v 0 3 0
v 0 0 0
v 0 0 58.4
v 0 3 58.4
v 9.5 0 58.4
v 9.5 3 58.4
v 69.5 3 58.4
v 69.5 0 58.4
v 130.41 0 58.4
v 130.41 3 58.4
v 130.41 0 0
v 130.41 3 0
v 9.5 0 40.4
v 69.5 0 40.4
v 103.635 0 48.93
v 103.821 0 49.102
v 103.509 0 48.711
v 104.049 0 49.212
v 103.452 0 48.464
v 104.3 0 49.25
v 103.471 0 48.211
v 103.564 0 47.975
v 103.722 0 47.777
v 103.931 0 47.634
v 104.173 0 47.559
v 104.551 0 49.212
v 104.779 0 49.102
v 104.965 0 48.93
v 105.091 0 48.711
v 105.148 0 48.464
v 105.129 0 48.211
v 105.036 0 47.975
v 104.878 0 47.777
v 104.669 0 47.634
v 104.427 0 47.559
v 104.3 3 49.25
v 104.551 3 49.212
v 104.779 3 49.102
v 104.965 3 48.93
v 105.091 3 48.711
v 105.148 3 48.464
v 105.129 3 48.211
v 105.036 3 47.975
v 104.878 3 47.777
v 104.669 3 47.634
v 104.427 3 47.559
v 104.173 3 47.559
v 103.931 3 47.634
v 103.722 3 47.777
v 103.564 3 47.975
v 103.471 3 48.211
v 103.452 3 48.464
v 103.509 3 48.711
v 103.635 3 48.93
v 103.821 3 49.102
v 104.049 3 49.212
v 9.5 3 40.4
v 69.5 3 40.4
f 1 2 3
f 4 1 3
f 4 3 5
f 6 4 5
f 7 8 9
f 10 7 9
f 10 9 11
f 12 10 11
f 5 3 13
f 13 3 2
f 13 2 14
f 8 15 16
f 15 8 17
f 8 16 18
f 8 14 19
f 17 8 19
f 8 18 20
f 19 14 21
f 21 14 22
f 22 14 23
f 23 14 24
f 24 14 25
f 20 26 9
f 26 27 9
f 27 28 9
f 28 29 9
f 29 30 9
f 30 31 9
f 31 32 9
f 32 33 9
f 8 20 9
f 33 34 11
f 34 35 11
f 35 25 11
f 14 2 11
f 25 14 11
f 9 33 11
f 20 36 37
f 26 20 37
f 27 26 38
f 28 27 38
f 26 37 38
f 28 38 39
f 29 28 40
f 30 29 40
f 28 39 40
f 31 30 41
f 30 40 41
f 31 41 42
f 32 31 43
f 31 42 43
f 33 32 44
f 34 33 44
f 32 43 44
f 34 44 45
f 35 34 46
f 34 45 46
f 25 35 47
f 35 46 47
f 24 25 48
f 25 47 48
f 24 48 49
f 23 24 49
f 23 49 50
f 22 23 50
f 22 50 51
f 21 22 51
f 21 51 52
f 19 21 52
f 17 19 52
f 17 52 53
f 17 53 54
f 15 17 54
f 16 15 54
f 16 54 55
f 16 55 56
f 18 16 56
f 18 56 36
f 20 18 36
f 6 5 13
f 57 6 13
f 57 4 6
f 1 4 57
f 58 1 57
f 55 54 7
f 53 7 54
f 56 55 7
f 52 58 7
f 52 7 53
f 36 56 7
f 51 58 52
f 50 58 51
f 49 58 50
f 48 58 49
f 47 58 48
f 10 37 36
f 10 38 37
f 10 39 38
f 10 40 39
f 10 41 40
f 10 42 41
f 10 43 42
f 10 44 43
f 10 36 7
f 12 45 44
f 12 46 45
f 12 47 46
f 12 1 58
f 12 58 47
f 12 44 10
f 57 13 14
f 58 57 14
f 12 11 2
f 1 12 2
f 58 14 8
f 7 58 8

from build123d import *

# Parameters (mm, degrees)
BOSS_EXTRUDE1_DEPTH = 3
SKETCH2_R           = 0.85
CUT_EXTRUDE1_DEPTH  = 143.920705638


with BuildPart() as part:
    # Sketch1 → Boss-Extrude1 (new body)
    with BuildSketch(Plane(origin=(0, 0, 0), x_dir=(1, 0, 0), z_dir=(0, 1, 0))):
        Polygon((130.41, 0), (0, 0), (0, -58.4), (9.5, -58.4), (9.5, -40.4), (69.5, -40.4), (69.5, -58.4), (130.41, -58.4), align=None)
    extrude(amount=BOSS_EXTRUDE1_DEPTH)

    # Sketch2 → Cut-Extrude1 (cut, through all)
    with BuildSketch(Plane(origin=(0, 3, 0), x_dir=(1, 0, 0), z_dir=(0, 1, 0))):
        with Locations(Location((104.3, -48.4, 0), (0, 0, 270))):
            Circle(SKETCH2_R)
    extrude(amount=-CUT_EXTRUDE1_DEPTH, mode=Mode.SUBTRACT)


solid = part.part
